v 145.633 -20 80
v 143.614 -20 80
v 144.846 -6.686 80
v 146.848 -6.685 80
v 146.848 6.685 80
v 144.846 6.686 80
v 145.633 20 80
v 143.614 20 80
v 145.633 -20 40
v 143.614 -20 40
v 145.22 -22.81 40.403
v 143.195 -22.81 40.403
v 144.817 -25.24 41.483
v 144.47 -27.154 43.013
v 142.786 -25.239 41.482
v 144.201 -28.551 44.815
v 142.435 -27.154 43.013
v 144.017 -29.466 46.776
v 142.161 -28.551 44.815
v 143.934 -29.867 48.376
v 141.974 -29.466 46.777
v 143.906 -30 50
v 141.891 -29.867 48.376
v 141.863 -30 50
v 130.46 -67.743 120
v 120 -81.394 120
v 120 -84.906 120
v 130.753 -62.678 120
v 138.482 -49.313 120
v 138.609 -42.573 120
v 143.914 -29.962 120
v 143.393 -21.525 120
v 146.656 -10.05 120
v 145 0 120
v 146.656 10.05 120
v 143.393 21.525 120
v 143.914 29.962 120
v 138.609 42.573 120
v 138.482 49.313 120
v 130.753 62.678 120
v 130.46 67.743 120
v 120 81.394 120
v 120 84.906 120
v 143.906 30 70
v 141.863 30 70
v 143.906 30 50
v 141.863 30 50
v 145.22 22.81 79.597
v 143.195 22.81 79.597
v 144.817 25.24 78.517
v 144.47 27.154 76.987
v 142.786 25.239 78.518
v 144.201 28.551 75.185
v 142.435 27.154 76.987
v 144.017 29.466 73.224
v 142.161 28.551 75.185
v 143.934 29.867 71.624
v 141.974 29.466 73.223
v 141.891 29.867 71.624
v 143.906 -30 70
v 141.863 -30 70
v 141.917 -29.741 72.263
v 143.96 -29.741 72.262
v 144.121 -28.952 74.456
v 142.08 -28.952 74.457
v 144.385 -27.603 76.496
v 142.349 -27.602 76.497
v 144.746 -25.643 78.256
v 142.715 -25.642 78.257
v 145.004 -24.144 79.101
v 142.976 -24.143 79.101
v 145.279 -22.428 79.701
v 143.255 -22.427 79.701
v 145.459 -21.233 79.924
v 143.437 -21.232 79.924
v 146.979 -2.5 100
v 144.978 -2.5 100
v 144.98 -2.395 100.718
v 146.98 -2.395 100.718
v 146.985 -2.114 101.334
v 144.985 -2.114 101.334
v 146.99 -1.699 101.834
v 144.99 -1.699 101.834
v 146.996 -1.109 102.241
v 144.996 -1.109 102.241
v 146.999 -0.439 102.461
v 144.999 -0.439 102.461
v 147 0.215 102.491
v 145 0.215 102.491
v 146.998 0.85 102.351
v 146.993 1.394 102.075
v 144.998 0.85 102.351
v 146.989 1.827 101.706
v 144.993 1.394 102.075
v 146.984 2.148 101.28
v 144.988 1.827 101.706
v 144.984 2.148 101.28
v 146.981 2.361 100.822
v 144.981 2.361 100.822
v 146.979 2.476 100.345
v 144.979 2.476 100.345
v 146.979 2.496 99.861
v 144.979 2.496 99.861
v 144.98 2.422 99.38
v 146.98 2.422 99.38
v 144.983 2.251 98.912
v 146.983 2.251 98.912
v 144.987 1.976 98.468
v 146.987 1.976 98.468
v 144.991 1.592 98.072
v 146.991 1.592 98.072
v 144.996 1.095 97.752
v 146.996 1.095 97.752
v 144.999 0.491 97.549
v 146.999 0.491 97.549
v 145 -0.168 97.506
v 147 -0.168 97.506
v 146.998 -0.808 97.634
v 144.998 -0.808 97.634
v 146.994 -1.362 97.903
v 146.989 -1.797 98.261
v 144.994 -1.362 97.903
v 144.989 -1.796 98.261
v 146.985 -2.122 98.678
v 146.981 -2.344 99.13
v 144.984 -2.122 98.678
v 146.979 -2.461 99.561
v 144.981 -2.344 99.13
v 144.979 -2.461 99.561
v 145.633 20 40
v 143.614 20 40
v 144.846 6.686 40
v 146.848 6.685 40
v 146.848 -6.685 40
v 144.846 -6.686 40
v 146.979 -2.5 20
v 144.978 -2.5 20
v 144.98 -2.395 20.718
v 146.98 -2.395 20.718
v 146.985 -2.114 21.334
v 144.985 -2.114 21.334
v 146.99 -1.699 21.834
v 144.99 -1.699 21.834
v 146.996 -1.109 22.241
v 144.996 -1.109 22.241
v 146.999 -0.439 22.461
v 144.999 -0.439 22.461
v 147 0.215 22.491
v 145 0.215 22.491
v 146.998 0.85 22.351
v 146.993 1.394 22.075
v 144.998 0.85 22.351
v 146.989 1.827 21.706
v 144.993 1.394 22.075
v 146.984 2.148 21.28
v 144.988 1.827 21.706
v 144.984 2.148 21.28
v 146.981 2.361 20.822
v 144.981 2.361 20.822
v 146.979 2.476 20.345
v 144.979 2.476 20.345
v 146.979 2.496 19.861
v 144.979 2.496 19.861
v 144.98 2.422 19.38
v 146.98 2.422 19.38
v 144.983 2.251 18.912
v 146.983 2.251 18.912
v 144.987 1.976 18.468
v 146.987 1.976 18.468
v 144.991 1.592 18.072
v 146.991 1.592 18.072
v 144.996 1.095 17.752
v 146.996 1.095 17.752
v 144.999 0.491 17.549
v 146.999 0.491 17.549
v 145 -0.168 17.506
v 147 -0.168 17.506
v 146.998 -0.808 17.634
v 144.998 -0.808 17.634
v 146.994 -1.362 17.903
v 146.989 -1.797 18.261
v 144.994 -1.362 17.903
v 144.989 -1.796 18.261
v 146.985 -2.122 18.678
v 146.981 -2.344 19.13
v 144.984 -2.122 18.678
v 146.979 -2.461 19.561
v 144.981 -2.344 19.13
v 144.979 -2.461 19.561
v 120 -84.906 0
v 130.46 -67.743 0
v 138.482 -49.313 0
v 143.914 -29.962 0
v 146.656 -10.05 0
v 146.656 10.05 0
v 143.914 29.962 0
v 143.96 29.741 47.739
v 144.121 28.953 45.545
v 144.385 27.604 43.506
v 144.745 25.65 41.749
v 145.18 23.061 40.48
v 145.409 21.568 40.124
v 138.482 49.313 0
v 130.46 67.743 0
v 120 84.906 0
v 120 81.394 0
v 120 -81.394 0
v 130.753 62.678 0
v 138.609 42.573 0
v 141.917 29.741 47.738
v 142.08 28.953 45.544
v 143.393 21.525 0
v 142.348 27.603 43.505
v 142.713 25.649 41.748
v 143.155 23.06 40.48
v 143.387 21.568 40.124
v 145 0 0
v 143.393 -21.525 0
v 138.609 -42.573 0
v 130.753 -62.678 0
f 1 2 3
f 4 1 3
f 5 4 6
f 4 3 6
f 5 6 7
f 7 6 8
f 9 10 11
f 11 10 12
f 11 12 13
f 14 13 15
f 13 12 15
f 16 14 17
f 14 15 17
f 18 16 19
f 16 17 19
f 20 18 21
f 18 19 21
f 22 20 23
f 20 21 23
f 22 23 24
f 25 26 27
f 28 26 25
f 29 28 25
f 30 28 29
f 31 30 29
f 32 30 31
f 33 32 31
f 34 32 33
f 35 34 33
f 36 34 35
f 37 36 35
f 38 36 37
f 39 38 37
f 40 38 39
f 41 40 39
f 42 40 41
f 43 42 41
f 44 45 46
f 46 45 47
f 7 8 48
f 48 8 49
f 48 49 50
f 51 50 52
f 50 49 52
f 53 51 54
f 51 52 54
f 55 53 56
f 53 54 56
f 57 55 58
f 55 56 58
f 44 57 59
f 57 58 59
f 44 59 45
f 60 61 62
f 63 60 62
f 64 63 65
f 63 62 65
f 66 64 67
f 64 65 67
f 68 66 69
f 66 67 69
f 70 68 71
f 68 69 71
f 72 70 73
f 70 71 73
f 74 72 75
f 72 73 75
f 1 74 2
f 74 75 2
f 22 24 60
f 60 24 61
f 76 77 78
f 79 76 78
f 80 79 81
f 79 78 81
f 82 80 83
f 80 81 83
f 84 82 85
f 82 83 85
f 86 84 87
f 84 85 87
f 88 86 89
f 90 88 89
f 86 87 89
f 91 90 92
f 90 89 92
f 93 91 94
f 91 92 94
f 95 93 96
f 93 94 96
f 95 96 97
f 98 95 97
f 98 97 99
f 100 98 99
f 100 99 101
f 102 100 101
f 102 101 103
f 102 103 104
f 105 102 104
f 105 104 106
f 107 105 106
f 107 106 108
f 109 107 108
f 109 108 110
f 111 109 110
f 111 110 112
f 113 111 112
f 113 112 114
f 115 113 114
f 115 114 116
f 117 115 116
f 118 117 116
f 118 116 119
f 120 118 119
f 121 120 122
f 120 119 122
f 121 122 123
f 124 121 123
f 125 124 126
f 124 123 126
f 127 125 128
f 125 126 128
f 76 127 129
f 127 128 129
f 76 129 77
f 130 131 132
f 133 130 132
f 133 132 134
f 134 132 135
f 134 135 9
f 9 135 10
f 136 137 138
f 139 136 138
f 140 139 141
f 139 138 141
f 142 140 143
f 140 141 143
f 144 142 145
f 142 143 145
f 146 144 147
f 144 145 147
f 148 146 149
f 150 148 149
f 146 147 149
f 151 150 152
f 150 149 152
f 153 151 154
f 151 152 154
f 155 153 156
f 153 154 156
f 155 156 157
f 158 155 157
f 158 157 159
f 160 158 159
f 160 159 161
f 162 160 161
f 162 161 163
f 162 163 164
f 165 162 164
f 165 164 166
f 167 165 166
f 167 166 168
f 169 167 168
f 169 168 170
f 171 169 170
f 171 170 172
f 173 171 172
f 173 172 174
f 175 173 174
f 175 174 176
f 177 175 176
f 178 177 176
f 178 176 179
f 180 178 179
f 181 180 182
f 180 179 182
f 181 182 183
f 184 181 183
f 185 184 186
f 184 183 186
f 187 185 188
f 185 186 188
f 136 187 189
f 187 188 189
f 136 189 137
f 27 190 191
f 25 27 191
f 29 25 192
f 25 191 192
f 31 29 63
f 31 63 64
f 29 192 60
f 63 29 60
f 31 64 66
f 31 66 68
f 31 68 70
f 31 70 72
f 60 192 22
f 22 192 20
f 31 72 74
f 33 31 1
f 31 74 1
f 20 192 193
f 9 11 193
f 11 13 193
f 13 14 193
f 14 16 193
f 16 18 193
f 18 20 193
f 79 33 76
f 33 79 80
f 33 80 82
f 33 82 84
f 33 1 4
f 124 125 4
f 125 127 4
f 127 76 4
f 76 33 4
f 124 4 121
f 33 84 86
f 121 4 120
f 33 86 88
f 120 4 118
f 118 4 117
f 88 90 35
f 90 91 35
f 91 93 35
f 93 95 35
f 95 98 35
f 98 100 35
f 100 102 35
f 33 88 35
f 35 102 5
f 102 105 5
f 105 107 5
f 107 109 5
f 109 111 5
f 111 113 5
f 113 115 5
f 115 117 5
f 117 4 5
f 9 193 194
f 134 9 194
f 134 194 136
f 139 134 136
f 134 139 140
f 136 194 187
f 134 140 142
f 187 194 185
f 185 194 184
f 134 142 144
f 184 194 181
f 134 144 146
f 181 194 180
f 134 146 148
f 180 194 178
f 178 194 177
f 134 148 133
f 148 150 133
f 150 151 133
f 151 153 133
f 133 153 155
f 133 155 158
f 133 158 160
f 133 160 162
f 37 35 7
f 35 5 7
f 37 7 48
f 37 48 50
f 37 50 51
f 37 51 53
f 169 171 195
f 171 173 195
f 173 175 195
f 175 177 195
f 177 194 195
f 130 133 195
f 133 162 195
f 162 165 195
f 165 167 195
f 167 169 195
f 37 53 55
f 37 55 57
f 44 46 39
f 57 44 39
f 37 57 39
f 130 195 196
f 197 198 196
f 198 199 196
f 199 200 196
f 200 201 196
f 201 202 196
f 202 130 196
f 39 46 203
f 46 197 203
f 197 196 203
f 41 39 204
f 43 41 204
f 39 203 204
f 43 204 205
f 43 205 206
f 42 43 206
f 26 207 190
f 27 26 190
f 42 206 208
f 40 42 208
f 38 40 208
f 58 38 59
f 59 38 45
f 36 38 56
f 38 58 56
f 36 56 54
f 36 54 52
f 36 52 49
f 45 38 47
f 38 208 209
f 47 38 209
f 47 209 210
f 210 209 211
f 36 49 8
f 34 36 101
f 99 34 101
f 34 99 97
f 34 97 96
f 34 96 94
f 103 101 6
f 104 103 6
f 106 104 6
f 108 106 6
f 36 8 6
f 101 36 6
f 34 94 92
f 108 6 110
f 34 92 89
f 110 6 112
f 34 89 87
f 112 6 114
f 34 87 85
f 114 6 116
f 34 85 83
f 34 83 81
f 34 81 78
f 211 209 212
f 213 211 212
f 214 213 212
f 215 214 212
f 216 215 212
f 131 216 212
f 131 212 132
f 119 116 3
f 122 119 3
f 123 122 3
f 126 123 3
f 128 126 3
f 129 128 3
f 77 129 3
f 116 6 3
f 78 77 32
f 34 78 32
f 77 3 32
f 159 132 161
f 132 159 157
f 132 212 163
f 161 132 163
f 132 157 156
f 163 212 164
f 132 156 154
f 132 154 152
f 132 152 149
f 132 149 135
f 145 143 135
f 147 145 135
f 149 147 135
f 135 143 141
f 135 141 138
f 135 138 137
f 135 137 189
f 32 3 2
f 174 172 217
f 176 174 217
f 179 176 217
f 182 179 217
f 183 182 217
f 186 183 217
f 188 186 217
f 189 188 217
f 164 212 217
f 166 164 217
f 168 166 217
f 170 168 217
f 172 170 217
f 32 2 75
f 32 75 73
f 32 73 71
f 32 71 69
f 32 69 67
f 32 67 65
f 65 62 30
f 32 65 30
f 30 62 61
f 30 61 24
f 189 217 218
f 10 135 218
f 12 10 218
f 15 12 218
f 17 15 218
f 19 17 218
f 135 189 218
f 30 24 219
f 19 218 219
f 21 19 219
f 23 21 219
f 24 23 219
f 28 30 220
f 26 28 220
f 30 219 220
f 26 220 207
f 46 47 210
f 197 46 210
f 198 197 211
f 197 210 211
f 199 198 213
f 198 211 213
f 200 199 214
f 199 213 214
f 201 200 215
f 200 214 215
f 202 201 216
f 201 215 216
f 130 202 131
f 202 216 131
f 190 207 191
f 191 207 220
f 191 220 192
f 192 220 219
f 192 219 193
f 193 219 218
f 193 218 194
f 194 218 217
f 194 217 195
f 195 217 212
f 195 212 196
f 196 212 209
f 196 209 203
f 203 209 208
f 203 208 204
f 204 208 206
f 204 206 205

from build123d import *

# Parameters (mm, degrees)
BOSS_EXTRU_1_DEPTH                = 120
DIAM_TRE_DU_PER_AGE_5_0_5_1_D     = 5
DIAM_TRE_DU_PER_AGE_5_0_5_1_DEPTH = 60
DIAM_TRE_DU_PER_AGE_5_0_5_1_TIP   = 1.502151548
ENL_V_MAT_EXTRU_2_DEPTH           = 208.889393843


with BuildPart() as part:
    # Esquisse1 → Boss.-Extru.1 (new body)
    with BuildSketch(Plane.XY):
        with BuildLine():
            Line((120, 84.905830189), (120, 81.39410298))
            ThreePointArc((120, 81.39410298), (145, 0), (120, -81.39410298))
            Line((120, -81.39410298), (120, -84.905830189))
            ThreePointArc((120, -84.905830189), (147, 0), (120, 84.905830189))
        make_face()
    extrude(amount=BOSS_EXTRU_1_DEPTH)

    # Diamètre du perçage Ø5.0 (5)1
    with Locations(Plane(origin=(147, 0, 20), x_dir=(0, 1, 0), z_dir=(1, 0, 0))):
        with Locations((0, 0), (0, 80)):
            Hole(DIAM_TRE_DU_PER_AGE_5_0_5_1_D / 2, depth=DIAM_TRE_DU_PER_AGE_5_0_5_1_DEPTH)
            with Locations((0, 0, -(DIAM_TRE_DU_PER_AGE_5_0_5_1_DEPTH + DIAM_TRE_DU_PER_AGE_5_0_5_1_TIP / 2))):  # 118° drill point
                Cone(0, DIAM_TRE_DU_PER_AGE_5_0_5_1_D / 2, DIAM_TRE_DU_PER_AGE_5_0_5_1_TIP, mode=Mode.SUBTRACT)

    # Esquisse3 → Enlèv. mat.-Extru.2 (cut, through all)
    with BuildSketch(Plane(origin=(0, 0, 0), x_dir=(0, 0, -1), z_dir=(1, 0, 0))):
        with BuildLine():
            Line((-70, 30), (-50, 30))
            ThreePointArc((-50, 30), (-42.928932188, 27.071067812), (-40, 20))
            Line((-40, 20), (-40, -20))
            ThreePointArc((-40, -20), (-42.928932188, -27.071067812), (-50, -30))
            Line((-50, -30), (-70, -30))
            ThreePointArc((-70, -30), (-77.071067812, -27.071067812), (-80, -20))
            Line((-80, -20), (-80, 20))
            ThreePointArc((-80, 20), (-77.071067812, 27.071067812), (-70, 30))
        make_face()
    extrude(amount=ENL_V_MAT_EXTRU_2_DEPTH, mode=Mode.SUBTRACT)


solid = part.part
